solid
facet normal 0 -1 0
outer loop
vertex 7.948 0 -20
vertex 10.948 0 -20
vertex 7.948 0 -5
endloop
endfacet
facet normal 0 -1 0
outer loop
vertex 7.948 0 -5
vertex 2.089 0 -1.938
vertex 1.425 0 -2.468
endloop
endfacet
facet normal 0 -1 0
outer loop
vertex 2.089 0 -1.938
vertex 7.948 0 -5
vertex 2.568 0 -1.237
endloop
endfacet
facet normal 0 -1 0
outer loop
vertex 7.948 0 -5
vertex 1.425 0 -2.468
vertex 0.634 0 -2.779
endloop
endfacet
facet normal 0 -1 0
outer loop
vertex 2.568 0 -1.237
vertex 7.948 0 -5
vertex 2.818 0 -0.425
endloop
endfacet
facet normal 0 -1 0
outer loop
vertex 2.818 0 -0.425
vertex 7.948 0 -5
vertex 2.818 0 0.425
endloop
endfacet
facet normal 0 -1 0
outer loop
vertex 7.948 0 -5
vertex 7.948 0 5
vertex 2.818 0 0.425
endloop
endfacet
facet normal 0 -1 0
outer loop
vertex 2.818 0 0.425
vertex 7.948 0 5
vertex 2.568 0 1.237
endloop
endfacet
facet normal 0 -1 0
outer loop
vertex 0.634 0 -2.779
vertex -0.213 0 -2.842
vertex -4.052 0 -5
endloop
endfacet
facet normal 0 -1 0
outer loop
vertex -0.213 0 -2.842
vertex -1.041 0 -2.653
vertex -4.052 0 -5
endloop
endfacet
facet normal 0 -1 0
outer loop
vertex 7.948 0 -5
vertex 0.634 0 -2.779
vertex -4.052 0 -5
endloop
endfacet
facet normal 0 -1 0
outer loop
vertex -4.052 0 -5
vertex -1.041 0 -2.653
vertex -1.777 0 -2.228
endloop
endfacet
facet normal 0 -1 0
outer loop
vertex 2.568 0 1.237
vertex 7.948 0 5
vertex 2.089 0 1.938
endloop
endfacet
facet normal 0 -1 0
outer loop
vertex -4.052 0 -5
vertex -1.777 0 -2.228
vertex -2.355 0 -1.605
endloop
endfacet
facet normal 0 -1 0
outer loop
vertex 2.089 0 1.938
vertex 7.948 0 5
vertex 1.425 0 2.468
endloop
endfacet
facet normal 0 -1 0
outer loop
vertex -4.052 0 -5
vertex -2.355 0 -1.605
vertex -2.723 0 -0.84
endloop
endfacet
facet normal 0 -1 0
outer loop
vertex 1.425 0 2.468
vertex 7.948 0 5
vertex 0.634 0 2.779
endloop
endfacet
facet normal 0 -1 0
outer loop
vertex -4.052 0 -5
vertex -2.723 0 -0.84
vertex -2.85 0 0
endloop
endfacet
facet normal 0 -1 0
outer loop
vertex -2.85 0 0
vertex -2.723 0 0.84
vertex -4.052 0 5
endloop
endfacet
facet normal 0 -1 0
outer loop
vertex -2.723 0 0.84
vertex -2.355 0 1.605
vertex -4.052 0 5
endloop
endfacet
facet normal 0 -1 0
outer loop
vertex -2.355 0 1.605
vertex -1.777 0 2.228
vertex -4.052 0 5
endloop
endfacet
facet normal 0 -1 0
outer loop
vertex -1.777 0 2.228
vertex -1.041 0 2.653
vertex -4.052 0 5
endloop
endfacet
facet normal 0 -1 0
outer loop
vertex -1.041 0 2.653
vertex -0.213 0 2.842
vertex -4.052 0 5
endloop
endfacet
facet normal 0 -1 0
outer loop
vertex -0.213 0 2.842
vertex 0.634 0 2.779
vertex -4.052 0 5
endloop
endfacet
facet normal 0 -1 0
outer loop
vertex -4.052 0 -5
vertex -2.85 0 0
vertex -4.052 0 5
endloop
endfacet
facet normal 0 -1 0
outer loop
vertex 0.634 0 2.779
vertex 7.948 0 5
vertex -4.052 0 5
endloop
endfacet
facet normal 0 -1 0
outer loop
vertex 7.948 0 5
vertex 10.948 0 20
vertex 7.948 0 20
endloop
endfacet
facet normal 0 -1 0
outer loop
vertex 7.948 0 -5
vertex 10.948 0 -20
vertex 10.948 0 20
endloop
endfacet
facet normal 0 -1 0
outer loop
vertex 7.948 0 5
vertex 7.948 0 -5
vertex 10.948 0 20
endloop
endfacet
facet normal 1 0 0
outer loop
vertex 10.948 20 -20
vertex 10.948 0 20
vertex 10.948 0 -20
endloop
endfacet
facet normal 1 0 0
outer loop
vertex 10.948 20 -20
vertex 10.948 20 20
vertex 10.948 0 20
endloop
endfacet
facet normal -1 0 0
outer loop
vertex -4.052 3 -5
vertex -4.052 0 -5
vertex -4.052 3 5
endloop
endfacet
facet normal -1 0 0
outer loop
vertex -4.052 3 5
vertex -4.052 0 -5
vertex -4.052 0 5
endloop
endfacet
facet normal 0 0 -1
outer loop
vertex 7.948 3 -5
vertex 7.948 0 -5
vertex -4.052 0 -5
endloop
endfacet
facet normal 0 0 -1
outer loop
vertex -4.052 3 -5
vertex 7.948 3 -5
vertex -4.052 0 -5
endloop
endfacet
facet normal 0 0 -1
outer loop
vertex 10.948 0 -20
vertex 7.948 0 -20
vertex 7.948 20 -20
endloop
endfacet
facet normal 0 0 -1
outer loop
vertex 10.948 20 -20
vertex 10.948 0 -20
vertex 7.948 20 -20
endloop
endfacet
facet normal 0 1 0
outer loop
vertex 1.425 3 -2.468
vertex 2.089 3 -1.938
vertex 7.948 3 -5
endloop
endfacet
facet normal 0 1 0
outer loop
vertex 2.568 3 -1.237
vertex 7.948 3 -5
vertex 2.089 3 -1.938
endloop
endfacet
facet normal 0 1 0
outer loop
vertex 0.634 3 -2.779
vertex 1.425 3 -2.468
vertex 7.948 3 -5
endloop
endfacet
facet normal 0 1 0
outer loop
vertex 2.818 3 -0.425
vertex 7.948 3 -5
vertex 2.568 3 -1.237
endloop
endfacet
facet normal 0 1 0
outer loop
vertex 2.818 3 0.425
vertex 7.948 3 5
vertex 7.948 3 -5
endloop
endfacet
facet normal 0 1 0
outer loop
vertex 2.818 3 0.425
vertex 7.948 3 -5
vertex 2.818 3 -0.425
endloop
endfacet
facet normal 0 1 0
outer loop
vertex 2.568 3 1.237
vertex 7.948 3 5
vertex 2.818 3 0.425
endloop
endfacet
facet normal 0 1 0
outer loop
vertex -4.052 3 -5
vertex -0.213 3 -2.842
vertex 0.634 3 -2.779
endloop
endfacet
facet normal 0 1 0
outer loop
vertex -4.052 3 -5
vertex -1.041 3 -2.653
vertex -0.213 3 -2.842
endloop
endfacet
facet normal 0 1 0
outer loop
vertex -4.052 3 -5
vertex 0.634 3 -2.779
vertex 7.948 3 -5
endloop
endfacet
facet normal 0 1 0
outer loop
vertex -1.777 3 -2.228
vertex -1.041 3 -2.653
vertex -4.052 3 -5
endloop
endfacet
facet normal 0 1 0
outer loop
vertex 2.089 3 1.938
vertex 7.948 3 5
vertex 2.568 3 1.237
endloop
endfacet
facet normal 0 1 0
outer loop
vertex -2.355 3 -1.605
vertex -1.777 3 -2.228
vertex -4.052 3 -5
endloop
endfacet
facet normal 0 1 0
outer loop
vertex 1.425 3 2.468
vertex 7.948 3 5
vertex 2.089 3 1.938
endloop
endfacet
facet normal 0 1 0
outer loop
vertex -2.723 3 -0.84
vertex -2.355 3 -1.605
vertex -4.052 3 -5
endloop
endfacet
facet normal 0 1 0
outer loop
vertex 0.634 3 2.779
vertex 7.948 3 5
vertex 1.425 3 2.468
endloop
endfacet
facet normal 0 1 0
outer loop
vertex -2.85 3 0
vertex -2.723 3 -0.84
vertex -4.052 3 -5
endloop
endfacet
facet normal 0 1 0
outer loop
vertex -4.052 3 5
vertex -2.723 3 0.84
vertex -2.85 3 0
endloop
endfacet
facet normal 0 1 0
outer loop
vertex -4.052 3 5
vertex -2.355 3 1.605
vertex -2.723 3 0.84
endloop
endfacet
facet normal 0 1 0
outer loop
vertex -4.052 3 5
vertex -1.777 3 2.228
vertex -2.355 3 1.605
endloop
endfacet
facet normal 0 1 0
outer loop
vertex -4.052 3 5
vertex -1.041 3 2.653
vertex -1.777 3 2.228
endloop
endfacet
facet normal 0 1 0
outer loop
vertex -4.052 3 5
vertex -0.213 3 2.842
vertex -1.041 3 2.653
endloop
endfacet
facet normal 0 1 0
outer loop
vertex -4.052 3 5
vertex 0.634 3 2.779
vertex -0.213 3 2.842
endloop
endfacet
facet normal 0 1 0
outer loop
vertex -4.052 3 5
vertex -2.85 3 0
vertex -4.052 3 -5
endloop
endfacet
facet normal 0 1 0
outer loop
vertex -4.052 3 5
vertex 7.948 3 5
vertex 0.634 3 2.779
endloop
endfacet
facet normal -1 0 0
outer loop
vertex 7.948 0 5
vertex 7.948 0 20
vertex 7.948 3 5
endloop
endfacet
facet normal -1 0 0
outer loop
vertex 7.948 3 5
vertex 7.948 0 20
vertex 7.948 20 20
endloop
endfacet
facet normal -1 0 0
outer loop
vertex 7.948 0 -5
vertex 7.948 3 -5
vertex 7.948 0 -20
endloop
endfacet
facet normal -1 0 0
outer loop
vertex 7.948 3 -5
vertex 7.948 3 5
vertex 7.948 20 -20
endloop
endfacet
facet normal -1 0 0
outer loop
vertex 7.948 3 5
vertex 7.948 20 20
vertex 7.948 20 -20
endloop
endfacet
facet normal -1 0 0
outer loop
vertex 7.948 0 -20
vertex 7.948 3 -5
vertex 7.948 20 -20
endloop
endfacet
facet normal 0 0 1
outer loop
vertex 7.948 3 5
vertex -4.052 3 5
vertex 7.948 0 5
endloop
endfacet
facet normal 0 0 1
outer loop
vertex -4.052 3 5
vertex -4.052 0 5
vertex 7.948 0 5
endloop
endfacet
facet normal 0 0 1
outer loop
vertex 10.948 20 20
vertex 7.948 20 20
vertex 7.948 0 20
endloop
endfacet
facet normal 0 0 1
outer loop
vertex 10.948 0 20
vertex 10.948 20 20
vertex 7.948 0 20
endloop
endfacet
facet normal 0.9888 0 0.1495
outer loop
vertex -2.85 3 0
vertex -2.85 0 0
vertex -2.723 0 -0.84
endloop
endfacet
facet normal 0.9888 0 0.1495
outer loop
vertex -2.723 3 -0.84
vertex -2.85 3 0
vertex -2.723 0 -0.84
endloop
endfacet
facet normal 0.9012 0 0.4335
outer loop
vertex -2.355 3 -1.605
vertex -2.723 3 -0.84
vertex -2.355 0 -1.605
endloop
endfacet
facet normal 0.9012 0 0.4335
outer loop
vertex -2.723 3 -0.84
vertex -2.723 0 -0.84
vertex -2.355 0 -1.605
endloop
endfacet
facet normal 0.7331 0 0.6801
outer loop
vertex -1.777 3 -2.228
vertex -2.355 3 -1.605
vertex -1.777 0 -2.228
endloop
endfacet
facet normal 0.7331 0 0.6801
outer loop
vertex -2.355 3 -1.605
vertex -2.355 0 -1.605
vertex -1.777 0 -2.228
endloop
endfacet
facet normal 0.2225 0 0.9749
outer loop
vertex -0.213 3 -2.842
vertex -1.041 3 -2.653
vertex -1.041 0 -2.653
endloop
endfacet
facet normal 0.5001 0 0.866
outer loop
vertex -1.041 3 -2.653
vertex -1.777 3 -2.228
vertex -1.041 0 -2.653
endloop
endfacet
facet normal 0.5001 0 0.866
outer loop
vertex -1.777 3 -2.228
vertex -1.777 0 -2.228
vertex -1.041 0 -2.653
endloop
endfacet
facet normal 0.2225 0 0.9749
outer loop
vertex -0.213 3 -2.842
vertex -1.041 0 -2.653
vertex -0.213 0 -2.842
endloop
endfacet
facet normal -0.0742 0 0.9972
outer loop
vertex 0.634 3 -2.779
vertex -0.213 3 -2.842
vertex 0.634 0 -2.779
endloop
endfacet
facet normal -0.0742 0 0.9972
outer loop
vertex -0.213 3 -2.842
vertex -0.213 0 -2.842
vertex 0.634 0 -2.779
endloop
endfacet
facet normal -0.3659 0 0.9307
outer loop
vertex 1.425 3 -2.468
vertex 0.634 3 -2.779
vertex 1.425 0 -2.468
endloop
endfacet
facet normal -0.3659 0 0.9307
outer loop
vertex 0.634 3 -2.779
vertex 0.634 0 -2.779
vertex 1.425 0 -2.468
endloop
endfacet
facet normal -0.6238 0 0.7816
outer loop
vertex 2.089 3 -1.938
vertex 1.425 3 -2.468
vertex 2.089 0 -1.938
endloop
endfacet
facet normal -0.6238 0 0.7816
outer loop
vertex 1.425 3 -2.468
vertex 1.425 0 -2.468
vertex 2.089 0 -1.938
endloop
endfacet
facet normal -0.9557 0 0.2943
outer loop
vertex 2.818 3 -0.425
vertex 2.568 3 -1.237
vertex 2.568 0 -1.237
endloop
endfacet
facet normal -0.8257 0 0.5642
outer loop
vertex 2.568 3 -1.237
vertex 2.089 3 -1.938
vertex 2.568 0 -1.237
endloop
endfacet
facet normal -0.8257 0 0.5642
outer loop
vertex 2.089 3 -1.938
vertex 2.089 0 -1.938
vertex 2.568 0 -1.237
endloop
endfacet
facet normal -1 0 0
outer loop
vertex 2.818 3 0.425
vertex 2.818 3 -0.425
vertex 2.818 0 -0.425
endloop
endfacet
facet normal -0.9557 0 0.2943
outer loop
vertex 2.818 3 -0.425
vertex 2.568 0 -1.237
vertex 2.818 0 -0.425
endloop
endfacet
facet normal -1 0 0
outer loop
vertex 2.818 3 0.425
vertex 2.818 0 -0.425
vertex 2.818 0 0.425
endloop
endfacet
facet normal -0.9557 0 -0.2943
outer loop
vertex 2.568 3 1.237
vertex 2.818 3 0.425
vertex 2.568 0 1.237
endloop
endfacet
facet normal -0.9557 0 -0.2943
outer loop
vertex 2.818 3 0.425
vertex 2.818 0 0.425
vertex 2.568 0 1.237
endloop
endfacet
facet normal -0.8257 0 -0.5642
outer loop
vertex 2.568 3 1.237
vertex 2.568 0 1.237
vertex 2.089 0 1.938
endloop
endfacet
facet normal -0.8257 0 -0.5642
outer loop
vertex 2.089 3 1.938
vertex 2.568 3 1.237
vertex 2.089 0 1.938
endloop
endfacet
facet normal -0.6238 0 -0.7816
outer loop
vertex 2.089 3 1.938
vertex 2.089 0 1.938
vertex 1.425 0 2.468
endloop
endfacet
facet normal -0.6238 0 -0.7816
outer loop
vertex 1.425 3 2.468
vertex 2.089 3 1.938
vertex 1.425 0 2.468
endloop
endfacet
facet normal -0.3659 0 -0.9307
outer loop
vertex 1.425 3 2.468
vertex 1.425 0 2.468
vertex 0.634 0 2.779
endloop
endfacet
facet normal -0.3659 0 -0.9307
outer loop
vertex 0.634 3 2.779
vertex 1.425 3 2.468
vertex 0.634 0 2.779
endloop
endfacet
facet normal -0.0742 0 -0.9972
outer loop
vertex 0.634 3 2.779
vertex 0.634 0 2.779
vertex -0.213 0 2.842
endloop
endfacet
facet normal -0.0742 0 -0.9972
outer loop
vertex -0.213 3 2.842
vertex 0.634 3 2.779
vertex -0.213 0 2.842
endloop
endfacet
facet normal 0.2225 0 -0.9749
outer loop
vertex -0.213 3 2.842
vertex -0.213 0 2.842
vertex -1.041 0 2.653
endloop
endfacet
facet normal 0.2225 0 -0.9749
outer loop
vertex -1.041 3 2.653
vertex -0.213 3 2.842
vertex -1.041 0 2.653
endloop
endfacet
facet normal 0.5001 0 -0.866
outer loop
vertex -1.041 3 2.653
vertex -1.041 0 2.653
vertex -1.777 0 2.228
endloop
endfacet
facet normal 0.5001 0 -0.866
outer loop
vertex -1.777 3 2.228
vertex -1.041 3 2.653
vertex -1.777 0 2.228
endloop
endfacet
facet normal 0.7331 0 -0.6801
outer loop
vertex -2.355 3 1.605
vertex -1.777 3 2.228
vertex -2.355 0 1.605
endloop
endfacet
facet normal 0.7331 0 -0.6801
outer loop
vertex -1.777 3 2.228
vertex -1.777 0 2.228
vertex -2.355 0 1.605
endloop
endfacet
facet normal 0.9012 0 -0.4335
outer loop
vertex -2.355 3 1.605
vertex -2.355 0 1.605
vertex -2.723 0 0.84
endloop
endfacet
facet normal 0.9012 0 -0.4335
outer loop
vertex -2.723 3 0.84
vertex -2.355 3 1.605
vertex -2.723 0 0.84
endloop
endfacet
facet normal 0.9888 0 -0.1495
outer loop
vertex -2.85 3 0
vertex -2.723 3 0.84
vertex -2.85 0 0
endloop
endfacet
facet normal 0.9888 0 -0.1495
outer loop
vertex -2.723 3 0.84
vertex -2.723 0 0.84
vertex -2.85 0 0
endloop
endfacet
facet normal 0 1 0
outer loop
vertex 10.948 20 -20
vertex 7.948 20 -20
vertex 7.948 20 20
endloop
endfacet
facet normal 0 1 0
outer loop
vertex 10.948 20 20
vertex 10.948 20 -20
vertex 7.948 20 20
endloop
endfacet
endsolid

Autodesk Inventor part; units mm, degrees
ref_plane "YZ Plane" through (0, 0, 0) normal (1, 0, 0) x (0, 1, 0)
ref_plane "XZ Plane" through (0, 0, 0) normal (0, 1, 0) x (-1, 0, 0)
ref_plane "XY Plane" through (0, 0, 0) normal (0, 0, 1) x (1, 0, 0)
sketch "Sketch1" plane through (0, 0, 0) normal (0, 1, 0) x (-1, 0, 0)
  line L0 (4.0517, 5) -> (-7.9483, 5)
  line L1 (-7.9483, 5) -> (-7.9483, -5)
  line L2 (-7.9483, -5) -> (4.0517, -5)
  line L3 (4.0517, -5) -> (4.0517, 5)
  circle A0 centre (0, 0) radius 2.85
  dimension "d0" = 5.7
  dimension "d1" = 10
  dimension "d2" = 5
  dimension "d3" = 12
extrude "Extrusion1" add sketch "Sketch1" along normal blind 3
sketch "Sketch2" plane through (7.9483, 0, 5) normal (1, 0, 0) x (0, 0, -1)
  line L0 (-15, 0) -> (25, 0)
  line L1 (25, 0) -> (25, 20)
  line L2 (25, 20) -> (-15, 20)
  line L3 (-15, 20) -> (-15, 0)
  line L4 (0, 0) -> (0, 3) projected
  line L5 (10, 0) -> (0, 0) projected
  point P0 (5, 0)
  dimension "d6" = 40
  dimension "d7" = 20
  dimension "d8" = 15
extrude "Extrusion2" add sketch "Sketch2" along normal blind 3
